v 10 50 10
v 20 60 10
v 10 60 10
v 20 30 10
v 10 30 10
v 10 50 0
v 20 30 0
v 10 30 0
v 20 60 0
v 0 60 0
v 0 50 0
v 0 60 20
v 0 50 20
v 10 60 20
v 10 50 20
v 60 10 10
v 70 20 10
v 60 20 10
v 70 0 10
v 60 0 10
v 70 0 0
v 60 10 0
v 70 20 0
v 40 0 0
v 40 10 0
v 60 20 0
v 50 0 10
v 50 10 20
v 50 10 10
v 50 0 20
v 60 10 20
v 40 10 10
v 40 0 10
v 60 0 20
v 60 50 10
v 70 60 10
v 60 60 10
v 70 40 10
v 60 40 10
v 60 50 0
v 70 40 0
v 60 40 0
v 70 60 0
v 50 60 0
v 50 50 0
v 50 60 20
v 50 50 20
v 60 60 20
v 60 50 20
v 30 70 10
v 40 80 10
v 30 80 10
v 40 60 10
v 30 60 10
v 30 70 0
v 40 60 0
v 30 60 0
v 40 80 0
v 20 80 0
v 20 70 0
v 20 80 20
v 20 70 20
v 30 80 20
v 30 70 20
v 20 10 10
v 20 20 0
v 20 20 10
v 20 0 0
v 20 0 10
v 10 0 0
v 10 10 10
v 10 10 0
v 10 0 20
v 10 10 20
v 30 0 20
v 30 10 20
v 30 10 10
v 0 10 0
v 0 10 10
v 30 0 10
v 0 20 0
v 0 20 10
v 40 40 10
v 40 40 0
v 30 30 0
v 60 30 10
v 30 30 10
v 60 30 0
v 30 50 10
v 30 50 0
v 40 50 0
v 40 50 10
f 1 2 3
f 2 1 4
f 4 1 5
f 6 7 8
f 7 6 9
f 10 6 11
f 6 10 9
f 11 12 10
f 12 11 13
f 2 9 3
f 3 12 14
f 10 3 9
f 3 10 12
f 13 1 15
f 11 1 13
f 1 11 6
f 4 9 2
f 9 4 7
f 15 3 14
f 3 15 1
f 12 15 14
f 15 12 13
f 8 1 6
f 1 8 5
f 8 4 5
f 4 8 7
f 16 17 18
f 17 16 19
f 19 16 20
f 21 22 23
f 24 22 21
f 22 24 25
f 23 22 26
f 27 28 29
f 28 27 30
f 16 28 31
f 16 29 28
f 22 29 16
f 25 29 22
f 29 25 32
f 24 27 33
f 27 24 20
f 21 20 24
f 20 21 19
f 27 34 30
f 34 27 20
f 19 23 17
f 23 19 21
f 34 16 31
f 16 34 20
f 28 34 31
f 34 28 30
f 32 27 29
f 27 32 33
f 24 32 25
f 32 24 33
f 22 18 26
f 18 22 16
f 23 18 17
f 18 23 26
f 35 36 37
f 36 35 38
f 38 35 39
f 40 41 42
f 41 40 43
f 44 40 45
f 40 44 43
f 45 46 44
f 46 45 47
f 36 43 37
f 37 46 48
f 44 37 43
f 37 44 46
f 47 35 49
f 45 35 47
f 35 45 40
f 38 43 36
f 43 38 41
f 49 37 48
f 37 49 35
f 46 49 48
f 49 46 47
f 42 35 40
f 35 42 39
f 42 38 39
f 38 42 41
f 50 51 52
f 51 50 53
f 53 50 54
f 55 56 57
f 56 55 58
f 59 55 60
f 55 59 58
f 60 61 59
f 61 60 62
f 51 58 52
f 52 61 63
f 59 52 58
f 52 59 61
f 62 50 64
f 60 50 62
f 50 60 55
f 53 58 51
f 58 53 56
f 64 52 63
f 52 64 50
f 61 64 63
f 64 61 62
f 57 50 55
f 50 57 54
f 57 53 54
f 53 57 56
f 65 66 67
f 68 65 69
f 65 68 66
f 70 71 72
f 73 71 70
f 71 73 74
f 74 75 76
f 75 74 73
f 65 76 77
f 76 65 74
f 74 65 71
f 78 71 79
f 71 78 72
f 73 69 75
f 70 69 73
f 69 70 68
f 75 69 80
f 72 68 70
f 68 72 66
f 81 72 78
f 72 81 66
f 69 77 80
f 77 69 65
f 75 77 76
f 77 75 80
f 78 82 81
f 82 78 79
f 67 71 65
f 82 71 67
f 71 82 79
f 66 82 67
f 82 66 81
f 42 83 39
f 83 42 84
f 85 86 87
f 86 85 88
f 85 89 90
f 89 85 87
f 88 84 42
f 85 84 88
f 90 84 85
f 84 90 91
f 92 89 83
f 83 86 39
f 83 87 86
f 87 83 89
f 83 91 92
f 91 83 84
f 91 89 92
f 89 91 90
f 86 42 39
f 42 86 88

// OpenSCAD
//cubo rojo//

//LL
module LL(unidad){
     cube(unidad);
     translate ([unidad,0,0]){
       cube(unidad);}
     translate ([0,0,unidad]){
       cube(unidad);}
          }       
//piezaT    
module piezaT(unidad){
  LL(unidad);
    translate([-unidad,0,0]){
     cube([unidad,unidad,unidad]);}
    translate([unidad,unidad,0]){
     cube([unidad,unidad,unidad]);} 
     }
                  
//gemeloI
module gemeloI(unidad){
   LL(unidad);
    translate([unidad,-unidad,0]){
     cube(unidad);}}     

//piezaZ     
module piezaZ(unidad){  
    LL(unidad);
    translate([unidad,unidad,-unidad]){
     cube([unidad,unidad,2*unidad]);}}  

//piezaL
module piezaL(unidad){
    LL(unidad);
    translate([2*unidad,0,0]){
     cube(unidad);}} 
    
//piezaGamma
module piezaGamma(unidad){
 LL(unidad);
  translate([unidad,-2*unidad,0]){
     cube([unidad,2*unidad,unidad]);}  
 }
  
translate([0,50,0]){       
piezaGamma(10);} 
translate([50,0,0]){ 
piezaT(10);}
translate([50,50,0]){
gemeloI(10);}
translate([20,70,0]){ 
gemeloI(10);}        
translate([10,0,20]){ 
  rotate([0,90,0]){
  piezaZ(10);}}  
translate([30,30,10]){ 
  rotate([-90,0,0]){
      piezaL(10);}}          
